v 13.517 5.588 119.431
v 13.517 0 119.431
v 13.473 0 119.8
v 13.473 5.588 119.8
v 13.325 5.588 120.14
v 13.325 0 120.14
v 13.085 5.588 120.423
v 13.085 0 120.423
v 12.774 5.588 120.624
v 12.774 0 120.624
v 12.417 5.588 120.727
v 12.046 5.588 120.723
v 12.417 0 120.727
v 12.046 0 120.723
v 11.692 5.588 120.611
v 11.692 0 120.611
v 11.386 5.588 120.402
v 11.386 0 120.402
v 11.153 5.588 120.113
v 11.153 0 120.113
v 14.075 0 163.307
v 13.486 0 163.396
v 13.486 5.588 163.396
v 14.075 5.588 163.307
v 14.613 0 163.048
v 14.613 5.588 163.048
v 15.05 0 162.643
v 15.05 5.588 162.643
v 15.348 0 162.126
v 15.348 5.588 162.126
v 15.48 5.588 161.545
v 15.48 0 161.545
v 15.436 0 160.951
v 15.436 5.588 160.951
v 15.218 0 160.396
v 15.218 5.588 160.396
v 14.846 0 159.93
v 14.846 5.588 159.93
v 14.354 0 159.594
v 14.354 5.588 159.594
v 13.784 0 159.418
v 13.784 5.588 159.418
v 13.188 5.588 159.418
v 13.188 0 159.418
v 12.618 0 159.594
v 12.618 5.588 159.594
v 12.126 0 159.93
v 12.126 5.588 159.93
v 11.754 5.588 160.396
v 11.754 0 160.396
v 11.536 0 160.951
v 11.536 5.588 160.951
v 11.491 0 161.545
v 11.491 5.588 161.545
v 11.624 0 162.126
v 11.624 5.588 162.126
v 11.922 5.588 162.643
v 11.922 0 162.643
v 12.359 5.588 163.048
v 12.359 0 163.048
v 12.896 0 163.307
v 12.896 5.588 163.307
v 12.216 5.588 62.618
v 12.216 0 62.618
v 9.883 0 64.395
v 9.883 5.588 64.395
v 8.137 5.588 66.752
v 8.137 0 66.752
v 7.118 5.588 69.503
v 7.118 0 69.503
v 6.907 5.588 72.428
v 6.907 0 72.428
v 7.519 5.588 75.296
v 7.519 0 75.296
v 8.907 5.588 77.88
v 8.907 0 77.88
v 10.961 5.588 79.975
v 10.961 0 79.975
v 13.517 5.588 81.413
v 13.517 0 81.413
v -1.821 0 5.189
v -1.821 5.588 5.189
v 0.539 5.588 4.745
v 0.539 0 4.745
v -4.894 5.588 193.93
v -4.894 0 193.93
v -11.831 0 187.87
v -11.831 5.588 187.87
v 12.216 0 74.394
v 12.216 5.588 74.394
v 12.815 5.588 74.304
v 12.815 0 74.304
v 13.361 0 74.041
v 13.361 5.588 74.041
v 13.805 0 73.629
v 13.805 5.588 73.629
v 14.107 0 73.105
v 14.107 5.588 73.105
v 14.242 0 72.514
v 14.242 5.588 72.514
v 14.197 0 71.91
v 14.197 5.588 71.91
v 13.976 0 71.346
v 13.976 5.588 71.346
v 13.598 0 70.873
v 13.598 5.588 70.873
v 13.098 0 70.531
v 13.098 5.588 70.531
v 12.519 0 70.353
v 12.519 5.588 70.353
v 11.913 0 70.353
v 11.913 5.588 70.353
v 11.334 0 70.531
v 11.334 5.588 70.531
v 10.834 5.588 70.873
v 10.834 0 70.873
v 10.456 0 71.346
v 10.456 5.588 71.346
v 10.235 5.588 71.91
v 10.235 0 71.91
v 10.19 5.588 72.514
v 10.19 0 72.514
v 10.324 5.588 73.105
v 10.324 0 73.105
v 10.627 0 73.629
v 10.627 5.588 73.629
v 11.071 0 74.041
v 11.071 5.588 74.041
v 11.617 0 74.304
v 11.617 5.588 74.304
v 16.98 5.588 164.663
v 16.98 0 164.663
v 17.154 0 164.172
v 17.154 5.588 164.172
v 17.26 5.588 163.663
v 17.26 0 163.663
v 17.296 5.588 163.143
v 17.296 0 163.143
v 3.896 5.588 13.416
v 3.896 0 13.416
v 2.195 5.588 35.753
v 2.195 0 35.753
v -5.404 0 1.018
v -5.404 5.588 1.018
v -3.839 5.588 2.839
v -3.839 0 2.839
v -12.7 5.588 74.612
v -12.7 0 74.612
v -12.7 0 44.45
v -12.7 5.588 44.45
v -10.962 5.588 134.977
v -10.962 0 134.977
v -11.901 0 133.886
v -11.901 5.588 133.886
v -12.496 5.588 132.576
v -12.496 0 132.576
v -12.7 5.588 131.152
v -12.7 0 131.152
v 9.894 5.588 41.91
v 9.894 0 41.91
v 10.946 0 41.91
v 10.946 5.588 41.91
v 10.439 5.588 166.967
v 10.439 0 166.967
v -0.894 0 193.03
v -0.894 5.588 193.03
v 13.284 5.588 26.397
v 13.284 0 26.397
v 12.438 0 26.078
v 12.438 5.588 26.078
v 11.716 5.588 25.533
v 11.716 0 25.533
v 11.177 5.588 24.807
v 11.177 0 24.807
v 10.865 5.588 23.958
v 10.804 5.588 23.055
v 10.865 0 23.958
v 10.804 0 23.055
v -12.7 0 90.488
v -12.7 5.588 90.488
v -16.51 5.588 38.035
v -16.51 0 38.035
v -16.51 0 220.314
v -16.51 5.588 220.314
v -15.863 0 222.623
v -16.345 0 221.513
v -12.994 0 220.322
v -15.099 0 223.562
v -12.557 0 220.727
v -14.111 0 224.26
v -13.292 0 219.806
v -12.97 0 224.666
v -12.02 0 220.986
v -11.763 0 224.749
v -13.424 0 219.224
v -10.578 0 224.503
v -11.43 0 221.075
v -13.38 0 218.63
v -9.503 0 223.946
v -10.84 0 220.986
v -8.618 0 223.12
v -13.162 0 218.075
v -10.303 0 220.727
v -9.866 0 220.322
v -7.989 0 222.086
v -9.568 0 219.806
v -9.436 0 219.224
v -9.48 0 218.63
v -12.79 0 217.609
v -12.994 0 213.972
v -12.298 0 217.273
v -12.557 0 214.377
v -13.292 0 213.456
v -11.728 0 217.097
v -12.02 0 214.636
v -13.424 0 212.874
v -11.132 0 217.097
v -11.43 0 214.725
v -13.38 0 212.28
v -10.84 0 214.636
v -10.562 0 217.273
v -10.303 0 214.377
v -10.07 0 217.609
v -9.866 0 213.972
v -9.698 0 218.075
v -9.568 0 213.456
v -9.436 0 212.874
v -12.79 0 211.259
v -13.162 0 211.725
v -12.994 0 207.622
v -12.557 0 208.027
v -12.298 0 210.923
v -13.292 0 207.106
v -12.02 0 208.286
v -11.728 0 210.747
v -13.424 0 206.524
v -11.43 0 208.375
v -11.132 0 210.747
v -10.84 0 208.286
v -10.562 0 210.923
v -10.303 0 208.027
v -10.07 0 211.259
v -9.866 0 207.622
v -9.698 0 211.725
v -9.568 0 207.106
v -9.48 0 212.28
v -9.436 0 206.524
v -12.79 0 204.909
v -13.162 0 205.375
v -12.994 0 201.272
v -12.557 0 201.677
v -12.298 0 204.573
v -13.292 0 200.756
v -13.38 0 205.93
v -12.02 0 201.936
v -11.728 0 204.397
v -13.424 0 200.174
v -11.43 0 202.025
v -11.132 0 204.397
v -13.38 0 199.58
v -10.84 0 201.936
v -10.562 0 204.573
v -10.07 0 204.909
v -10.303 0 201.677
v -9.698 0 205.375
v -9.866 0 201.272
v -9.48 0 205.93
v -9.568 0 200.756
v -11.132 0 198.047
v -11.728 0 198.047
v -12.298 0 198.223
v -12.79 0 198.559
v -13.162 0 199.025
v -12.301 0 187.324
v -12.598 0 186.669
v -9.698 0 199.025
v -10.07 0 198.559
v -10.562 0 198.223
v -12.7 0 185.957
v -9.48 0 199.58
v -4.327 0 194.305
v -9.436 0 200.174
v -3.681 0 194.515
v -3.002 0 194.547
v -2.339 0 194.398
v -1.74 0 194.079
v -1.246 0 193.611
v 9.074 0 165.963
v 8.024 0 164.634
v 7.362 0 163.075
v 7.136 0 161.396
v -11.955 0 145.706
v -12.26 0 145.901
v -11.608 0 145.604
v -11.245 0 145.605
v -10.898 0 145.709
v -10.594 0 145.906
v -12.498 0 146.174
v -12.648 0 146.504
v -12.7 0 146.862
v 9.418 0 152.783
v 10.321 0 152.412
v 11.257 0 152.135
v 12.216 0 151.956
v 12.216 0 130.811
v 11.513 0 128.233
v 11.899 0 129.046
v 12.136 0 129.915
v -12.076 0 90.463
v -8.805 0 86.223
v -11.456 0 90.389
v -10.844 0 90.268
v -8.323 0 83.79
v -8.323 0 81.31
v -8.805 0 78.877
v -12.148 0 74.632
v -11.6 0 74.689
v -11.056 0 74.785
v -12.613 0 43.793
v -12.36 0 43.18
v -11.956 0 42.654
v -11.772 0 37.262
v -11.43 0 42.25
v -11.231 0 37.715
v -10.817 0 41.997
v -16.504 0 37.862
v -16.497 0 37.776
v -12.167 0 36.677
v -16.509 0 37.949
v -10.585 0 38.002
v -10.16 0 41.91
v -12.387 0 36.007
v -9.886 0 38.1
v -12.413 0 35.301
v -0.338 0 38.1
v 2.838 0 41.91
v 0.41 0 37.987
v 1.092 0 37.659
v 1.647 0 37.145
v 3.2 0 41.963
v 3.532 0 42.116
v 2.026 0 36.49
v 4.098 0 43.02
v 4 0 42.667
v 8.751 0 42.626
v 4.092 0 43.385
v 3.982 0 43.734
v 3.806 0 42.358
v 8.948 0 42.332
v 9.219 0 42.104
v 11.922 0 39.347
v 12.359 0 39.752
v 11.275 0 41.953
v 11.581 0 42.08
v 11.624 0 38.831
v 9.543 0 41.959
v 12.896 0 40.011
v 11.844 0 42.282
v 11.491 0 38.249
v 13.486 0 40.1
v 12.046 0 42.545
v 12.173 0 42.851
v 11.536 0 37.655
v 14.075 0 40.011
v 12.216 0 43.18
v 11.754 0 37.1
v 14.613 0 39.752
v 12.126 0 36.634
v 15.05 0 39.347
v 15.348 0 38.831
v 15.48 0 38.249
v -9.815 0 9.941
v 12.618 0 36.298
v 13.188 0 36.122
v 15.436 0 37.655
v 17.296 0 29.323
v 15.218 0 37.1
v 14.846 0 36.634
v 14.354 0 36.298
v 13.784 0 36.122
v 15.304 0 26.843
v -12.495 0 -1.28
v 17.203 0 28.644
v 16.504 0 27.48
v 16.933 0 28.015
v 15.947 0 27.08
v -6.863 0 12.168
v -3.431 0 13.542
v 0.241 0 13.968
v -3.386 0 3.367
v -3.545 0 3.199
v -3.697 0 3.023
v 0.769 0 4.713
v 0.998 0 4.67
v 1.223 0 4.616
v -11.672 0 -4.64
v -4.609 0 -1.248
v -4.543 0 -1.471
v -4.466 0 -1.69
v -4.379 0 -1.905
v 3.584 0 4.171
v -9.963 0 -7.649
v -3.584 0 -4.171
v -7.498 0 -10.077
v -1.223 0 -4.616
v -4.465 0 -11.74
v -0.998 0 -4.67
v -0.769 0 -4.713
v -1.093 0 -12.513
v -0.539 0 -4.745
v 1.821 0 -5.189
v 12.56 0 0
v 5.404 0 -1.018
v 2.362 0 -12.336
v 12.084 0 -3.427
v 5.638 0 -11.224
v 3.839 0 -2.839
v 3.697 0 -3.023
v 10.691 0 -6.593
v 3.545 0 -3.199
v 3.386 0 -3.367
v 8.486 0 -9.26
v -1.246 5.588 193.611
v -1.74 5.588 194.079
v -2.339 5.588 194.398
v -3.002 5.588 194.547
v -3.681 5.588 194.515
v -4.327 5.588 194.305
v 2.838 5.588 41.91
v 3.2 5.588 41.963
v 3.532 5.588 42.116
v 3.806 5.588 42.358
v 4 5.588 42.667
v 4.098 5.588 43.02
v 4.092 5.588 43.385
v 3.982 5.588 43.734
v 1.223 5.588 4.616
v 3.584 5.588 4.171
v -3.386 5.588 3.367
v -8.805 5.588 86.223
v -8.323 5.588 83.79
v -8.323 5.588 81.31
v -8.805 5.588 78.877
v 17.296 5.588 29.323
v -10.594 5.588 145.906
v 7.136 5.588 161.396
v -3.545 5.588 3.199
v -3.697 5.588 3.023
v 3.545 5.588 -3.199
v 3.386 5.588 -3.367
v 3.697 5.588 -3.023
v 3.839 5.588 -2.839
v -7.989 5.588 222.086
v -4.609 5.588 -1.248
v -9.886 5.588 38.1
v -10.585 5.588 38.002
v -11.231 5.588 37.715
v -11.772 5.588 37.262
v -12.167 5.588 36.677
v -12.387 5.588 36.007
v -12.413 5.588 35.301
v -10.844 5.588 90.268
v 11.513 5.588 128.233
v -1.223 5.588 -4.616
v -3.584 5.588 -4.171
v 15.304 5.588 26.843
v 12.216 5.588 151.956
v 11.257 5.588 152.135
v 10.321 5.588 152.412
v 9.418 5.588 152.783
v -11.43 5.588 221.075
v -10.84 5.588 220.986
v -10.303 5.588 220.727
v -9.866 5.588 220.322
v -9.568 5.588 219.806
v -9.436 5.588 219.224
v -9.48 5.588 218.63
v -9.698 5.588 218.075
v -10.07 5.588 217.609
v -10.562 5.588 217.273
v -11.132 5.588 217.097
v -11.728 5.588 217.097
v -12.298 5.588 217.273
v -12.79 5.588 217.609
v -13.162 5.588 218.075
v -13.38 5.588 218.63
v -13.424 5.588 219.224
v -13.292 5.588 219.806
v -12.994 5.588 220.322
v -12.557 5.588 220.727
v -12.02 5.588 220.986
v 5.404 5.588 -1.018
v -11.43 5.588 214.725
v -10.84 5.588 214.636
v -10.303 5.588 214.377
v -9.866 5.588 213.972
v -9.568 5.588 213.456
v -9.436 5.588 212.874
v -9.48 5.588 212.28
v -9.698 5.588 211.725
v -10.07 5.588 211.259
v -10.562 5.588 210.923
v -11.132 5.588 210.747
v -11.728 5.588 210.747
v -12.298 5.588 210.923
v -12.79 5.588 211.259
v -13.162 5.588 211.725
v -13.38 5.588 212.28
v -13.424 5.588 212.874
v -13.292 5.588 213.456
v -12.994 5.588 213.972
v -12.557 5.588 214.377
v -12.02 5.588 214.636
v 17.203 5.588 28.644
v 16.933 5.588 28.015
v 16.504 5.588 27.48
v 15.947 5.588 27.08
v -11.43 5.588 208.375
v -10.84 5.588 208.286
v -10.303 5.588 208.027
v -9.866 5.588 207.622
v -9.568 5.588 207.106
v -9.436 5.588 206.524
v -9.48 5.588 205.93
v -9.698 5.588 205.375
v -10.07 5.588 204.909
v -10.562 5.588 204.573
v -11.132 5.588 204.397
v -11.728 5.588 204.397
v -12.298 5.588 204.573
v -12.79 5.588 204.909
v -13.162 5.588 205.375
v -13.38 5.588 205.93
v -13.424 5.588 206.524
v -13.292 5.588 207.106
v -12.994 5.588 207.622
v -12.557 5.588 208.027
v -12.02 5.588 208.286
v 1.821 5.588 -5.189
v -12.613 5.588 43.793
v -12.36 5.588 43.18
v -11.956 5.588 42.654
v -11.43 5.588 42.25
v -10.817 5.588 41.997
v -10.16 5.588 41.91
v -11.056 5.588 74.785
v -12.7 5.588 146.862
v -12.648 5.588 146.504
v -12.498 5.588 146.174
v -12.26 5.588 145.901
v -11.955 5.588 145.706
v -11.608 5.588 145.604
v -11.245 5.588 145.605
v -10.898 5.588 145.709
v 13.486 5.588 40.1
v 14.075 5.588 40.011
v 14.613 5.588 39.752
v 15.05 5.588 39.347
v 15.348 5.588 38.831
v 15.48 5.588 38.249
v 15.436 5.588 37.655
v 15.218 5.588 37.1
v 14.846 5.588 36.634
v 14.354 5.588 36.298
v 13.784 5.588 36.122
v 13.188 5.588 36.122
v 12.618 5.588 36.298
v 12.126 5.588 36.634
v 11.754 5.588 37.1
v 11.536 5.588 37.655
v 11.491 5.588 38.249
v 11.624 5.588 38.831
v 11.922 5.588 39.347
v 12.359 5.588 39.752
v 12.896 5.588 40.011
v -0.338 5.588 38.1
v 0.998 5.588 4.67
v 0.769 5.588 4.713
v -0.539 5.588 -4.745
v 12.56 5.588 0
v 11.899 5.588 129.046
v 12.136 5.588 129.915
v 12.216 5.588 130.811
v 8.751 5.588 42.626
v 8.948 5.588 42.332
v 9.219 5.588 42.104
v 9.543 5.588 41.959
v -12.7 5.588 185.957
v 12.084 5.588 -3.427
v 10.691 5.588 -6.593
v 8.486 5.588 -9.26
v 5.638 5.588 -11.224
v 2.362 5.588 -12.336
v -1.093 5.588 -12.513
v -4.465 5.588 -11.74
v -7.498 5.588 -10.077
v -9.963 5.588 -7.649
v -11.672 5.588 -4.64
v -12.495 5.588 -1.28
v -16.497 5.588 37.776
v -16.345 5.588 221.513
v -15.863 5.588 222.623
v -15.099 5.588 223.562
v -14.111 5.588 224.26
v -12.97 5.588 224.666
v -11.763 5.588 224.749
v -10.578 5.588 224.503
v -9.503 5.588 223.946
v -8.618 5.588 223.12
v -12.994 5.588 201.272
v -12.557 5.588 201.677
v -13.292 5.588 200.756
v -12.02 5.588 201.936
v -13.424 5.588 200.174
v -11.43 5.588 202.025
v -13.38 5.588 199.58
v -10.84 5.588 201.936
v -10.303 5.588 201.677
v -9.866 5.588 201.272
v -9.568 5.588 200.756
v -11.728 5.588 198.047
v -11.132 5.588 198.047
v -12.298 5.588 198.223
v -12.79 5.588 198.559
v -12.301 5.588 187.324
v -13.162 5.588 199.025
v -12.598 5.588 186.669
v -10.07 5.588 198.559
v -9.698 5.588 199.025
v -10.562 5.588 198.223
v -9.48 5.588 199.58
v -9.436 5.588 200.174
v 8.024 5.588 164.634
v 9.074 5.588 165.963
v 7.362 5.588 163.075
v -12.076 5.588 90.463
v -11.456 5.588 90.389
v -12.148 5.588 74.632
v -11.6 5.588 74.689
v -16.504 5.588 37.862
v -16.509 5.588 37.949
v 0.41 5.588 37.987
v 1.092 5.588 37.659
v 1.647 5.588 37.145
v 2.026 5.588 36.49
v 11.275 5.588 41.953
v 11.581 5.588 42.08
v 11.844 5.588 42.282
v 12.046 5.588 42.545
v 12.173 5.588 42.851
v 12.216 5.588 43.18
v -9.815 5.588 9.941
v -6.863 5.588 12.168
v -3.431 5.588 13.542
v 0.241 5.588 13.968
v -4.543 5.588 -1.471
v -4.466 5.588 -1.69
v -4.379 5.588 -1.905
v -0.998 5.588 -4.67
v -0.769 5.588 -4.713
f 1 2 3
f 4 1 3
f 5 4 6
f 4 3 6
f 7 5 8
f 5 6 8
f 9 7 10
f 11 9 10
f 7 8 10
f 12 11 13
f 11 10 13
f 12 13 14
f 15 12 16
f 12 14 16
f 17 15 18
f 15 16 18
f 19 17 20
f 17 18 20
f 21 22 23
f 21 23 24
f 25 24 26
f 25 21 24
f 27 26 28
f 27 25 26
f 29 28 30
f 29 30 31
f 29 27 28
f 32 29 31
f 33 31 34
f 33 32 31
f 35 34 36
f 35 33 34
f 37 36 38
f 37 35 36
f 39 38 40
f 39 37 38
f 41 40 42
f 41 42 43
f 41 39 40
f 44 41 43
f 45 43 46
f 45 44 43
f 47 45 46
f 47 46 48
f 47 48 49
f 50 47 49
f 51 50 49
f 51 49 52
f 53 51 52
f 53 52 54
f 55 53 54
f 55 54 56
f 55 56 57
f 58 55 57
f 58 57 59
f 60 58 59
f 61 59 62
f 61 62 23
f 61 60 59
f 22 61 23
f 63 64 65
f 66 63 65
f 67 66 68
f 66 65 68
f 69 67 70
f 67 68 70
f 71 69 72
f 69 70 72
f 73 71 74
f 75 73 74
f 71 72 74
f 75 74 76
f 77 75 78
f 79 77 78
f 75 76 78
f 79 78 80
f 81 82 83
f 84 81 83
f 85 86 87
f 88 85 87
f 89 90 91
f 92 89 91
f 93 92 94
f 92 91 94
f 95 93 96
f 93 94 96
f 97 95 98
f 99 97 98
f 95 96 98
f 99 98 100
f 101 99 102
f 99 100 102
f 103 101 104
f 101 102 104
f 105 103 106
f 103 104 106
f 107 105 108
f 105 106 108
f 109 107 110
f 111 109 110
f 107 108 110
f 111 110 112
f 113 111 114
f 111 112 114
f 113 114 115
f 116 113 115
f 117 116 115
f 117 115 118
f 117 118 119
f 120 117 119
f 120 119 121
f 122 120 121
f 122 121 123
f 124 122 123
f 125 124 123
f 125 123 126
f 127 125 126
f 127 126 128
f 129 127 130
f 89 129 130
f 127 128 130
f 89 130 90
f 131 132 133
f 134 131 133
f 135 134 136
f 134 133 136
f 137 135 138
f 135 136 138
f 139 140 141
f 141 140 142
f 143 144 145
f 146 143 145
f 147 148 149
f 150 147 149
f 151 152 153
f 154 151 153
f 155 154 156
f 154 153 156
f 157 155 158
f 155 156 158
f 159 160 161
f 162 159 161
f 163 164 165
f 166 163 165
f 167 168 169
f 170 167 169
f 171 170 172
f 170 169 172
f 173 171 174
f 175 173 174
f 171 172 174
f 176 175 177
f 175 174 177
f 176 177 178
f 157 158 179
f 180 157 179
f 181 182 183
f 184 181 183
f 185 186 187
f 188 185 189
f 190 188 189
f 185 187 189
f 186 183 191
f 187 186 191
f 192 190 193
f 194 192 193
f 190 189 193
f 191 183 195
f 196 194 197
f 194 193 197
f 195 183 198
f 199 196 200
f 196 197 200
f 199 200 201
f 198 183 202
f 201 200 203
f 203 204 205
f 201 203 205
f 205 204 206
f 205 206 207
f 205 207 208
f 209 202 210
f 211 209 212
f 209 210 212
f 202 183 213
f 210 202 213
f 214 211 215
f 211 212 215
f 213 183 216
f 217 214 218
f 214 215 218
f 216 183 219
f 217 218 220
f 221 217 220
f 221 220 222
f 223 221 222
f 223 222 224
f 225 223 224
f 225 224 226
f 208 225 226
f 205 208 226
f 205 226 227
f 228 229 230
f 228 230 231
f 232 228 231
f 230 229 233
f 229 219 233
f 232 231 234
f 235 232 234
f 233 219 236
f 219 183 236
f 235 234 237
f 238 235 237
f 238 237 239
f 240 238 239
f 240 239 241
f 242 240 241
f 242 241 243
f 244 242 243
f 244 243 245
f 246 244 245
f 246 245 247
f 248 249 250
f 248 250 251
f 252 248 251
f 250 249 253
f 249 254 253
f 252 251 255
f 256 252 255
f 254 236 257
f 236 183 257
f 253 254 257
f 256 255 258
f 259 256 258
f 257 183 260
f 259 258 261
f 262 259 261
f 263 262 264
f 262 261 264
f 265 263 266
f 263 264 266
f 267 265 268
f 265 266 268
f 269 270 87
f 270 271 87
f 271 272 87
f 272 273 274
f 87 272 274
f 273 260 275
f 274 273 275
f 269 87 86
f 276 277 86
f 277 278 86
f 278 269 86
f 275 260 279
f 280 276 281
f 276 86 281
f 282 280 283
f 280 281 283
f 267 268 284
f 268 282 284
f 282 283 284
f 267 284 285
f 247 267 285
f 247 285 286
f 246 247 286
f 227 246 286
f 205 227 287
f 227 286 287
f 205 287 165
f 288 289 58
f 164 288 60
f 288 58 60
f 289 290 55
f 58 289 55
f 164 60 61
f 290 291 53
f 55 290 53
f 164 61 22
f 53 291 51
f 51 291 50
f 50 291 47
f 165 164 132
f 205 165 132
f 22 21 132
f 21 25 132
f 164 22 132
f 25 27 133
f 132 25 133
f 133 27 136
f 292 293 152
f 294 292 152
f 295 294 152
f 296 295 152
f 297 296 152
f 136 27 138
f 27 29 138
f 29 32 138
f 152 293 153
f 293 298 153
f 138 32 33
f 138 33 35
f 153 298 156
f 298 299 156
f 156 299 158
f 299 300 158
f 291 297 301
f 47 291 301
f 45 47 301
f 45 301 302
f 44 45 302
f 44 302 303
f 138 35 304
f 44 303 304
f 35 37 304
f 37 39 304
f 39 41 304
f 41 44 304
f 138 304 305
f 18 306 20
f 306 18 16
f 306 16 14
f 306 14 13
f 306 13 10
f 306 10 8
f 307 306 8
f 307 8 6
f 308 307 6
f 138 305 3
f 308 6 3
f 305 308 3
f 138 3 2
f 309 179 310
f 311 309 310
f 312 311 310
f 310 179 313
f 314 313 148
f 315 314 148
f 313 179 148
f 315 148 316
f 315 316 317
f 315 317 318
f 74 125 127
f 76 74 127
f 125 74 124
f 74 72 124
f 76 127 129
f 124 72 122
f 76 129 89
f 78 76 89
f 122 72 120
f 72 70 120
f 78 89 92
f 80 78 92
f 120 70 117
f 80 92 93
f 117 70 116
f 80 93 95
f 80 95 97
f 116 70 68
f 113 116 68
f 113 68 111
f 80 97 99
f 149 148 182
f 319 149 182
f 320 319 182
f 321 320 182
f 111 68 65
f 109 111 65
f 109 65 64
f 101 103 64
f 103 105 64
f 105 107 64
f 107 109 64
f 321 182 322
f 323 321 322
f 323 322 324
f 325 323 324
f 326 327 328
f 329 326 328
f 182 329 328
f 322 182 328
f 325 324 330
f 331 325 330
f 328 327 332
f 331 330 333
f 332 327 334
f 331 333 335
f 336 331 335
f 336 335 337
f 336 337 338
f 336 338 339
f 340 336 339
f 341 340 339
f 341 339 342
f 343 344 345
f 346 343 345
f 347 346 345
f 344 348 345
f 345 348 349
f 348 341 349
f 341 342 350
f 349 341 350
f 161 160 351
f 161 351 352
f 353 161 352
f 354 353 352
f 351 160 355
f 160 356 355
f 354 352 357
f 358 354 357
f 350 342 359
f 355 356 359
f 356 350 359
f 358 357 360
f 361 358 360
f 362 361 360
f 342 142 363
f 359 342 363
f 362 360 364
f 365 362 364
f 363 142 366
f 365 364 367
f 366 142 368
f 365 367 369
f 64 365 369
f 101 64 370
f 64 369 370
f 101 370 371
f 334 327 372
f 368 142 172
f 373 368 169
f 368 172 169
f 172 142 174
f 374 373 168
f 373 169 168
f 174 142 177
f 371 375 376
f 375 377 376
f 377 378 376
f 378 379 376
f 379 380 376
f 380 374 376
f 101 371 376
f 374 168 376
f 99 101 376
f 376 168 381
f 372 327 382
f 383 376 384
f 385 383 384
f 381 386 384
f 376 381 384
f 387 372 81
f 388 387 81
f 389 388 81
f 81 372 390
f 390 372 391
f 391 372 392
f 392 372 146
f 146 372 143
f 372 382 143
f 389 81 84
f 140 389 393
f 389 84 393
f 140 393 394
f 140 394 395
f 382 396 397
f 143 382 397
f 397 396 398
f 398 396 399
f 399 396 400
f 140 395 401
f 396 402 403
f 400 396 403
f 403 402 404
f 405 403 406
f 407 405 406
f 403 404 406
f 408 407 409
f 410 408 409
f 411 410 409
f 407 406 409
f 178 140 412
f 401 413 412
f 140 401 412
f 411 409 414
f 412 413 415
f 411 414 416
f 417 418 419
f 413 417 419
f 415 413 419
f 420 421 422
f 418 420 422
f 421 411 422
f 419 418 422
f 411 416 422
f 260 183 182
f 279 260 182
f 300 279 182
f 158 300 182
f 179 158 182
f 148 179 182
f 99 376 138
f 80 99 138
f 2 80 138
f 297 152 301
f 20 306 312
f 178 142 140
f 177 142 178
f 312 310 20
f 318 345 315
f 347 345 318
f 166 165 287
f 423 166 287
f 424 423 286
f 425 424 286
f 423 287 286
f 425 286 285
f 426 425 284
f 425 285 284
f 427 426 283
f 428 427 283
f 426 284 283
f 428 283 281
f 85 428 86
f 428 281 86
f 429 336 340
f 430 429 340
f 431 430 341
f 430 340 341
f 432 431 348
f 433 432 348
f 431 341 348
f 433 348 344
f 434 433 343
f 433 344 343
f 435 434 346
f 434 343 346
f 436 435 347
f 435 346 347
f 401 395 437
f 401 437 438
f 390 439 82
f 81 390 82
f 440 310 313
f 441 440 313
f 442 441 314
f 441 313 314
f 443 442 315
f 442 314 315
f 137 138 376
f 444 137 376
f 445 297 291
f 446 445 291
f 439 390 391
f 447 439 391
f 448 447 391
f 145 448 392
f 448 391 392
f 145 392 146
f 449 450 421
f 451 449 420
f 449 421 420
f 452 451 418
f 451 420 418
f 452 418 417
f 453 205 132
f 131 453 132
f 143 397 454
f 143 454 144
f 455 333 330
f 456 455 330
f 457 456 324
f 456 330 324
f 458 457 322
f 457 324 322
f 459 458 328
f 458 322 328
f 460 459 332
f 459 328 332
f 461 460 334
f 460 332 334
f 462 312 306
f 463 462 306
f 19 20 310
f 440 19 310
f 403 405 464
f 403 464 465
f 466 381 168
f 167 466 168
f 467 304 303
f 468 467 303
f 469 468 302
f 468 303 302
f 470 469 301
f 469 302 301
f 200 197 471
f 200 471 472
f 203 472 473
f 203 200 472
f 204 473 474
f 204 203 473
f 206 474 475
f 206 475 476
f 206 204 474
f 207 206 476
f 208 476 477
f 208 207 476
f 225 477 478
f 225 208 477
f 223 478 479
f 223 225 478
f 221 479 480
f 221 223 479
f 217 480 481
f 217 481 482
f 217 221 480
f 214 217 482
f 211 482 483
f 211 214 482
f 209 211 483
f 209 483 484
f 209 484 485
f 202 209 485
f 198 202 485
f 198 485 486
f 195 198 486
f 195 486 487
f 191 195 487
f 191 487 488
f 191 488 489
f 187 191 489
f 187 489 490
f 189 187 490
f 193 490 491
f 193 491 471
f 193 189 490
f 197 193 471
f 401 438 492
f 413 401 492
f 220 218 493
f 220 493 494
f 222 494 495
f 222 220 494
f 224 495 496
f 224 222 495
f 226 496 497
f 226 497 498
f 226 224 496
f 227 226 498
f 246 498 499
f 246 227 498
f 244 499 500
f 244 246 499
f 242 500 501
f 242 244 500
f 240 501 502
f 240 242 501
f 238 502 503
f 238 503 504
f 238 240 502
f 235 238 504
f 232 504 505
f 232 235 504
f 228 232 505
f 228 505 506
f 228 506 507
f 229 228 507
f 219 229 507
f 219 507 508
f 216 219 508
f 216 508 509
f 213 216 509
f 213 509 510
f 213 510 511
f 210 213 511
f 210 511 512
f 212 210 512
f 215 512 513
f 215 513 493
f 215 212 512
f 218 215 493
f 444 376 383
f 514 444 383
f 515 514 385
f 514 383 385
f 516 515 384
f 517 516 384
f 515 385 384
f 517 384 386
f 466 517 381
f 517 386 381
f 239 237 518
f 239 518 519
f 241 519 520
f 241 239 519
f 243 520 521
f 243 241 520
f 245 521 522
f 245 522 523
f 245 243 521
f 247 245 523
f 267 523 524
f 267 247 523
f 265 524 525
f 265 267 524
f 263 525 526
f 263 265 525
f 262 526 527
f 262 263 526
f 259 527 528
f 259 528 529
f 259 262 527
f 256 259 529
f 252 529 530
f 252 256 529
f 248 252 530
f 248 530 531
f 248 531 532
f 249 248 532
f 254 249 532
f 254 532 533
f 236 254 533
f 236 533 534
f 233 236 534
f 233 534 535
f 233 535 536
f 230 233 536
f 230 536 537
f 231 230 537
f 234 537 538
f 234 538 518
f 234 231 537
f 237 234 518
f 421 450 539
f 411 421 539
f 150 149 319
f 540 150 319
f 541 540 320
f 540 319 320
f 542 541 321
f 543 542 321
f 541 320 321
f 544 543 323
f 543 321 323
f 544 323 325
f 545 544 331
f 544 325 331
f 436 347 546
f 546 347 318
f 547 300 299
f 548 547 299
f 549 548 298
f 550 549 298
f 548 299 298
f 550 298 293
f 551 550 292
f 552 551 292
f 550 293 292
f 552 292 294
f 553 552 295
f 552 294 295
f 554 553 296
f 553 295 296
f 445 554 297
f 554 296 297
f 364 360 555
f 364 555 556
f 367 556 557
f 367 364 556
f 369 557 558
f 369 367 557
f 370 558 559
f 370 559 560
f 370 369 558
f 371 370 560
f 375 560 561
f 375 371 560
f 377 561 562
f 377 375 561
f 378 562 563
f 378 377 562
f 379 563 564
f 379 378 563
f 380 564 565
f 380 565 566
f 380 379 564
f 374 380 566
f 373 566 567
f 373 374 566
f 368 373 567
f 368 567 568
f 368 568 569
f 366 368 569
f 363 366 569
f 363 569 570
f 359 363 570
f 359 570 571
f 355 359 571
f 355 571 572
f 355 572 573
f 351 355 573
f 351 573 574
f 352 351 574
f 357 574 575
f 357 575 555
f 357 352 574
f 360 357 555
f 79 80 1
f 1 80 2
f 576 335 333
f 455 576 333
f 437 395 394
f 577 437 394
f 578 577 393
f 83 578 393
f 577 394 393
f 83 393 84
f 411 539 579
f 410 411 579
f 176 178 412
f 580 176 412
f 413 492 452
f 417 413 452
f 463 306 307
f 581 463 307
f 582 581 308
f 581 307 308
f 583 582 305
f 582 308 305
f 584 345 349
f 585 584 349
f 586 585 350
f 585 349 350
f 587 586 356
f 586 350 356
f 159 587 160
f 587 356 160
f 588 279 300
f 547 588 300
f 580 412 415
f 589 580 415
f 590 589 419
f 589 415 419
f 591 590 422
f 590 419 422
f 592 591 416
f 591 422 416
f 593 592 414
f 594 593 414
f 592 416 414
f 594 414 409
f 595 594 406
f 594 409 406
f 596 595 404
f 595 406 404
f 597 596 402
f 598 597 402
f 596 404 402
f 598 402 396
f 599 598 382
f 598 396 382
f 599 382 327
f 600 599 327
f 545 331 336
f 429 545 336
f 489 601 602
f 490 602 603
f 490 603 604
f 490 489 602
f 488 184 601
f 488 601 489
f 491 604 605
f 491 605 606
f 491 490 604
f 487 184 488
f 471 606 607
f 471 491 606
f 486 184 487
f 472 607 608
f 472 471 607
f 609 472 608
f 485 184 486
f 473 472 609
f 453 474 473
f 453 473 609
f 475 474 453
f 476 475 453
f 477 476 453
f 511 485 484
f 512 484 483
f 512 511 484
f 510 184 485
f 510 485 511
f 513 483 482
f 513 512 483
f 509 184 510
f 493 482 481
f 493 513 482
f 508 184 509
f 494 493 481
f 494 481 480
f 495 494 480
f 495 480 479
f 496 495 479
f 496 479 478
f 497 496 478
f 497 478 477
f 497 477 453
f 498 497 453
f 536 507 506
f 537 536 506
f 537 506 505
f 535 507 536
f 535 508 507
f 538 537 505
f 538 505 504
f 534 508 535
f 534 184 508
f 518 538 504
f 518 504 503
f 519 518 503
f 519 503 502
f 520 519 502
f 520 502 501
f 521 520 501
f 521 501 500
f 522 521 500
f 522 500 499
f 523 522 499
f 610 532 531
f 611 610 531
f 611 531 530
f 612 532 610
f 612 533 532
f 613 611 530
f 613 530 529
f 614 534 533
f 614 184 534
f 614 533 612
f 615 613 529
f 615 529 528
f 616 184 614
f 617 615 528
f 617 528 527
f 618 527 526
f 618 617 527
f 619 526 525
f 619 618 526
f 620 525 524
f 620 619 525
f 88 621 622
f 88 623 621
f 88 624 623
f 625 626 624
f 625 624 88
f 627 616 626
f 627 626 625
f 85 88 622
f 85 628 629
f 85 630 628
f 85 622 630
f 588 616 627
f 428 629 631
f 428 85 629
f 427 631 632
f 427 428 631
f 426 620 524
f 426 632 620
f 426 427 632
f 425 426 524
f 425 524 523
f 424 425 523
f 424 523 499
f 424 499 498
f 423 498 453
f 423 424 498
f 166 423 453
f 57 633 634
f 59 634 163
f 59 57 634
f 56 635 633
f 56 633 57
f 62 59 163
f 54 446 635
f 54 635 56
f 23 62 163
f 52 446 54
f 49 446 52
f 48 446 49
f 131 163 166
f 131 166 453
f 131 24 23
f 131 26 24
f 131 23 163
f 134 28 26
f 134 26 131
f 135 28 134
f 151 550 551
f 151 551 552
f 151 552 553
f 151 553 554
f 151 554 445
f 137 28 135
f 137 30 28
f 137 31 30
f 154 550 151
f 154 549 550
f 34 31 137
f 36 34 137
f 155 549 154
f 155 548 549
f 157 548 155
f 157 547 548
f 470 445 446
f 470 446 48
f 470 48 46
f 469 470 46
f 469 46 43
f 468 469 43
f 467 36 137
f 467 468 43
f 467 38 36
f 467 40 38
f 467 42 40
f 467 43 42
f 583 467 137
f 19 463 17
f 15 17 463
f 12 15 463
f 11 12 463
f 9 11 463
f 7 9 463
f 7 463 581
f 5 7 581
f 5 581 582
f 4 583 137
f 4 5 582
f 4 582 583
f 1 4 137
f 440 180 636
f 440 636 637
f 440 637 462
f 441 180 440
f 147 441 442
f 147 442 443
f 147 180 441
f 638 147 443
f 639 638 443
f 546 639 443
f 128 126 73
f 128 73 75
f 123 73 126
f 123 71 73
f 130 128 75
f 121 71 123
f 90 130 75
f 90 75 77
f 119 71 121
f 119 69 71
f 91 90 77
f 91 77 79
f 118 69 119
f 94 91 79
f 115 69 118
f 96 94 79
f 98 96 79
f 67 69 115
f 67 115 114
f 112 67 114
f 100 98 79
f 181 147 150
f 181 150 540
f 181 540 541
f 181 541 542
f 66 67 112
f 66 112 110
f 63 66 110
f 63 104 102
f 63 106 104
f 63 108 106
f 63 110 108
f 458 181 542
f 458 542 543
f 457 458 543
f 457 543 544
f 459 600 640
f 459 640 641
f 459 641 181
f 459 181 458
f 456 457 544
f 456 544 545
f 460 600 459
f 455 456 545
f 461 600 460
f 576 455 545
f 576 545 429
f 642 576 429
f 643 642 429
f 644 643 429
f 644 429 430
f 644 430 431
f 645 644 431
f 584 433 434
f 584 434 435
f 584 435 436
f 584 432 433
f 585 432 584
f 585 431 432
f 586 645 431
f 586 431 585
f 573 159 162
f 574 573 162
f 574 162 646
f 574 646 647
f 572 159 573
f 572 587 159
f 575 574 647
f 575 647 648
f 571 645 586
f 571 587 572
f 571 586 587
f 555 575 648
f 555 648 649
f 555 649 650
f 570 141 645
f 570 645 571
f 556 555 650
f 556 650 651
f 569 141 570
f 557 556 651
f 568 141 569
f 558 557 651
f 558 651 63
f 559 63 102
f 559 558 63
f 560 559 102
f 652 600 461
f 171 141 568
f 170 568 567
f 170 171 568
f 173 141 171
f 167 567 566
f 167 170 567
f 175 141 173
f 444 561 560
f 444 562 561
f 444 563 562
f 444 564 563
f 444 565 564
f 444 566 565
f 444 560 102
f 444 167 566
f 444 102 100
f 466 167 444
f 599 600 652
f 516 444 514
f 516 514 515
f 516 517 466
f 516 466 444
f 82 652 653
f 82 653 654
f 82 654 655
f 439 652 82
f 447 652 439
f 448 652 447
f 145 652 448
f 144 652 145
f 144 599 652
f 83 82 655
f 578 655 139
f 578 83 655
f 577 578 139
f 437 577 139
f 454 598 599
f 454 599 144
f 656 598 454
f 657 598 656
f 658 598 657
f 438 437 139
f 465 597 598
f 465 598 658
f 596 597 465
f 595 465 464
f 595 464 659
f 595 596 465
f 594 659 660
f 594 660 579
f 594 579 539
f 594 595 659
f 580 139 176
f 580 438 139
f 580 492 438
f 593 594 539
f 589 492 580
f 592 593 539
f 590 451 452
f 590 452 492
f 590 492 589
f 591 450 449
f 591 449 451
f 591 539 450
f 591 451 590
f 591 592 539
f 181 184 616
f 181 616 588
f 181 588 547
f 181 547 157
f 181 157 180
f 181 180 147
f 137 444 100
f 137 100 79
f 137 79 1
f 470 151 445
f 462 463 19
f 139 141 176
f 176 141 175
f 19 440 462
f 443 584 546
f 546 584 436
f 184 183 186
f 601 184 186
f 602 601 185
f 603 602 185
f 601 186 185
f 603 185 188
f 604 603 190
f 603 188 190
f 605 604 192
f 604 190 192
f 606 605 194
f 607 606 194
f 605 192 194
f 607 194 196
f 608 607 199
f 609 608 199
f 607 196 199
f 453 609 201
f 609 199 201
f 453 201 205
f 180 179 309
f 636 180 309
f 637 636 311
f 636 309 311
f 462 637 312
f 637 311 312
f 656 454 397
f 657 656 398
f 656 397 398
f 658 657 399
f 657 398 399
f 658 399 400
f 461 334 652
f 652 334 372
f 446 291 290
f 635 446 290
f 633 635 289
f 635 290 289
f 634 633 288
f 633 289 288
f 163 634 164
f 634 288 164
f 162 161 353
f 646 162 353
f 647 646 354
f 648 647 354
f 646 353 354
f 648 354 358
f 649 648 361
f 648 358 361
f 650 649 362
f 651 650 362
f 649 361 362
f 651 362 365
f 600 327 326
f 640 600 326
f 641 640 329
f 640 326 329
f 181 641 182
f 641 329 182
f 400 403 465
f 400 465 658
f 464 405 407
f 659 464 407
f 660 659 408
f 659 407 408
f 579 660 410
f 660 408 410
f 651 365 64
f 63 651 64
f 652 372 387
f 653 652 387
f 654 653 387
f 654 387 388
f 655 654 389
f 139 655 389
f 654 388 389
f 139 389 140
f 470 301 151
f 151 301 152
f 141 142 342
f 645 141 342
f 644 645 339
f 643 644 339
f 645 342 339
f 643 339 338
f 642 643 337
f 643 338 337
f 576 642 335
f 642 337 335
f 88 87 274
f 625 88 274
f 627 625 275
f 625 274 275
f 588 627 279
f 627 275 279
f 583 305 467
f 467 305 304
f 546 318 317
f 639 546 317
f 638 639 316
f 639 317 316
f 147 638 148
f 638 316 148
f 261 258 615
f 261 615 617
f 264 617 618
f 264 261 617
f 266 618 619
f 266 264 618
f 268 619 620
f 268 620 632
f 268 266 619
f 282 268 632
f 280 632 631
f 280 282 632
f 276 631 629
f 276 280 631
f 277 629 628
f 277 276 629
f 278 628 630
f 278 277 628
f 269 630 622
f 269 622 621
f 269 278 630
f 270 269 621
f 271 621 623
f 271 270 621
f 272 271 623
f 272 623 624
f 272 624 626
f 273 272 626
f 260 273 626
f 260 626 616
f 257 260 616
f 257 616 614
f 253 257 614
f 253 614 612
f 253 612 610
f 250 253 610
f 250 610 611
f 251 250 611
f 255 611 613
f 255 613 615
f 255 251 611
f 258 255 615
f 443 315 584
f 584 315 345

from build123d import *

# Parameters (mm, degrees)
SKETCH2_R           = 2
SKETCH2_R_2         = 1.999999991
BOSS_EXTRUDE1_DEPTH = 5.588
SKETCH7_R           = 2.032
CUT_EXTRUDE1_DEPTH  = 5.588
CUT_EXTRUDE2_DEPTH  = 226.492641696


with BuildPart() as part:
    # Sketch2 → Boss-Extrude1 (new body)
    with BuildSketch(Plane(origin=(0, 0, 0), x_dir=(1, 0, 0), z_dir=(0, 1, 0))):
        with BuildLine():
            ThreePointArc((17.295902343, -29.323452593), (16.73639375, -27.733089808), (15.304363929, -26.843373987))
            Line((15.304363929, -26.843373987), (13.284423018, -26.396670406))
            ThreePointArc((13.284423018, -26.396670406), (11.420627025, -25.189010374), (10.804170553, -23.055431298))
            Line((10.804170553, -23.055431298), (12.5603, 0))
            ThreePointArc((12.5603, 0), (0.640974044, 12.543934326), (-12.49487995, 1.28027775))
            Line((-12.49487995, 1.28027775), (-16.496770465, -37.776201638))
            ThreePointArc((-16.496770465, -37.776201638), (-16.50669046, -37.90548449), (-16.51, -38.035105126))
            Line((-16.51, -38.035105126), (-16.51, -220.313887427))
            ThreePointArc((-16.51, -220.313887427), (-12.970187584, -224.665744552), (-7.988667969, -222.086327038))
            Line((-7.988667969, -222.086327038), (16.979901226, -164.662549258))
            ThreePointArc((16.979901226, -164.662549258), (17.216065593, -163.919190378), (17.295902343, -163.143315306))
            Line((17.295902343, -163.143315306), (17.295902343, -29.323452593))
        make_face()
        with Locations(Location((-11.43, -219.075, 0), (0, 0, 270))):
            Circle(SKETCH2_R, mode=Mode.SUBTRACT)
        with Locations(Location((-11.43, -212.725, 0), (0, 0, 270))):
            Circle(SKETCH2_R, mode=Mode.SUBTRACT)
        with Locations(Location((-11.43, -206.375, 0), (0, 0, 270))):
            Circle(SKETCH2_R, mode=Mode.SUBTRACT)
        with Locations(Location((-11.43, -200.025, 0), (0, 0, 270))):
            Circle(SKETCH2_R, mode=Mode.SUBTRACT)
        with BuildLine():
            ThreePointArc((7.135902343, -161.395796446), (8.023611961, -164.633987883), (10.438542905, -166.966801782))
            Line((10.438542905, -166.966801782), (-0.894016375, -193.029903785))
            ThreePointArc((-0.894016375, -193.029903785), (-2.665854515, -194.495144898), (-4.89449504, -193.929898651))
            Line((-4.89449504, -193.929898651), (-11.831146076, -187.869646091))
            ThreePointArc((-11.831146076, -187.869646091), (-12.472607947, -187.007278248), (-12.7, -185.95682859))
            Line((-12.7, -185.95682859), (-12.7, -146.861981888))
            ThreePointArc((-12.7, -146.861981888), (-11.955224829, -145.705677915), (-10.594426962, -145.905573138))
            Line((-10.594426962, -145.905573138), (7.135902343, -161.395796446))
        make_face(mode=Mode.SUBTRACT)
        with BuildLine():
            ThreePointArc((12.215902343, -151.955842791), (10.785297541, -152.261664921), (9.418398214, -152.782955151))
            Line((9.418398214, -152.782955151), (-10.962292152, -134.977225798))
            ThreePointArc((-10.962292152, -134.977225798), (-12.245215894, -133.252490112), (-12.7, -131.151590796))
            Line((-12.7, -131.151590796), (-12.7, -90.4875))
            ThreePointArc((-12.7, -90.4875), (-11.765673597, -90.432318214), (-10.844338135, -90.267540106))
            Line((-10.844338135, -90.267540106), (11.513275375, -128.23323342))
            ThreePointArc((11.513275375, -128.23323342), (12.037098881, -129.475107855), (12.215902343, -130.811024207))
            Line((12.215902343, -130.811024207), (12.215902343, -151.955842791))
        make_face(mode=Mode.SUBTRACT)
        with Locations(Location((13.485902343, -161.395796446, 0), (0, 0, 270))):
            Circle(SKETCH2_R, mode=Mode.SUBTRACT)
        with BuildLine():
            Line((-10.16, -41.91), (2.838491406, -41.91))
            ThreePointArc((2.838491406, -41.91), (3.914572403, -42.505500417), (3.981509018, -43.733543799))
            Line((3.981509018, -43.733543799), (-11.055993219, -74.784618621))
            ThreePointArc((-11.055993219, -74.784618621), (-11.873503915, -74.655646925), (-12.7, -74.6125))
            Line((-12.7, -74.6125), (-12.7, -44.45))
            ThreePointArc((-12.7, -44.45), (-11.956051224, -42.653948776), (-10.16, -41.91))
        make_face(mode=Mode.SUBTRACT)
        with BuildLine():
            ThreePointArc((-9.886442157, -38.1), (-11.771808813, -37.262055396), (-12.413212622, -35.301096512))
            Line((-12.413212622, -35.301096512), (-9.81475239, -9.941405108))
            ThreePointArc((-9.81475239, -9.941405108), (-3.431386466, -13.542026692), (3.896359547, -13.415635739))
            Line((3.896359547, -13.415635739), (2.194931831, -35.752912681))
            ThreePointArc((2.194931831, -35.752912681), (1.388767881, -37.42300808), (-0.337731726, -38.1))
            Line((-0.337731726, -38.1), (-9.886442157, -38.1))
        make_face(mode=Mode.SUBTRACT)
        with BuildLine():
            ThreePointArc((3.111707299, -3.622128204), (-4.505881672, 1.581001391), (4.69270869, 0.883753468))
            Line((4.69270869, 0.883753468), (3.111707299, -3.622128204))
        make_face(mode=Mode.SUBTRACT)
        with BuildLine():
            ThreePointArc((-8.804706991, -86.222769023), (-8.262040897, -82.55), (-8.804706991, -78.877230977))
            Line((-8.804706991, -78.877230977), (8.75092063, -42.626456201))
            ThreePointArc((8.75092063, -42.626456201), (9.219438659, -42.103919003), (9.893938242, -41.91))
            Line((9.893938242, -41.91), (10.945902343, -41.91))
            ThreePointArc((10.945902343, -41.91), (11.843927955, -42.281974388), (12.215902343, -43.18))
            Line((12.215902343, -43.18), (12.215902343, -62.618124667))
            ThreePointArc((12.215902343, -62.618124667), (6.906756389, -72.428110561), (13.516748759, -81.413145613))
            Line((13.516748759, -81.413145613), (13.516748759, -119.431411199))
            ThreePointArc((13.516748759, -119.431411199), (12.599191369, -120.688899116), (11.152950849, -120.113072943))
            Line((11.152950849, -120.113072943), (-8.804706991, -86.222769023))
        make_face(mode=Mode.SUBTRACT)
        with Locations(Location((13.485902343, -38.1, 0), (0, 0, 270))):
            Circle(SKETCH2_R_2, mode=Mode.SUBTRACT)
    extrude(amount=BOSS_EXTRUDE1_DEPTH)

    # Sketch7 → Cut-Extrude1 (cut)
    with BuildSketch(Plane(origin=(0, 5.588, 0), x_dir=(1, 0, 0), z_dir=(0, 1, 0))):
        with Locations(Location((12.215902343, -72.362149281, 0), (0, 0, 270))):
            Circle(SKETCH7_R)
    extrude(amount=-CUT_EXTRUDE1_DEPTH, mode=Mode.SUBTRACT)

    # Sketch8 → Cut-Extrude2 (cut, through all)
    with BuildSketch(Plane(origin=(0, 5.588, 0), x_dir=(1, 0, 0), z_dir=(0, 1, 0))):
        Polygon((1.820727883, 5.189106375), (-3.583534002, 4.171349788), (-5.404261886, -1.017756587), (-1.820727883, -5.189106375), (3.583534002, -4.171349788), (5.404261886, 1.017756587), align=None)
    extrude(amount=-CUT_EXTRUDE2_DEPTH, mode=Mode.SUBTRACT)


solid = part.part
